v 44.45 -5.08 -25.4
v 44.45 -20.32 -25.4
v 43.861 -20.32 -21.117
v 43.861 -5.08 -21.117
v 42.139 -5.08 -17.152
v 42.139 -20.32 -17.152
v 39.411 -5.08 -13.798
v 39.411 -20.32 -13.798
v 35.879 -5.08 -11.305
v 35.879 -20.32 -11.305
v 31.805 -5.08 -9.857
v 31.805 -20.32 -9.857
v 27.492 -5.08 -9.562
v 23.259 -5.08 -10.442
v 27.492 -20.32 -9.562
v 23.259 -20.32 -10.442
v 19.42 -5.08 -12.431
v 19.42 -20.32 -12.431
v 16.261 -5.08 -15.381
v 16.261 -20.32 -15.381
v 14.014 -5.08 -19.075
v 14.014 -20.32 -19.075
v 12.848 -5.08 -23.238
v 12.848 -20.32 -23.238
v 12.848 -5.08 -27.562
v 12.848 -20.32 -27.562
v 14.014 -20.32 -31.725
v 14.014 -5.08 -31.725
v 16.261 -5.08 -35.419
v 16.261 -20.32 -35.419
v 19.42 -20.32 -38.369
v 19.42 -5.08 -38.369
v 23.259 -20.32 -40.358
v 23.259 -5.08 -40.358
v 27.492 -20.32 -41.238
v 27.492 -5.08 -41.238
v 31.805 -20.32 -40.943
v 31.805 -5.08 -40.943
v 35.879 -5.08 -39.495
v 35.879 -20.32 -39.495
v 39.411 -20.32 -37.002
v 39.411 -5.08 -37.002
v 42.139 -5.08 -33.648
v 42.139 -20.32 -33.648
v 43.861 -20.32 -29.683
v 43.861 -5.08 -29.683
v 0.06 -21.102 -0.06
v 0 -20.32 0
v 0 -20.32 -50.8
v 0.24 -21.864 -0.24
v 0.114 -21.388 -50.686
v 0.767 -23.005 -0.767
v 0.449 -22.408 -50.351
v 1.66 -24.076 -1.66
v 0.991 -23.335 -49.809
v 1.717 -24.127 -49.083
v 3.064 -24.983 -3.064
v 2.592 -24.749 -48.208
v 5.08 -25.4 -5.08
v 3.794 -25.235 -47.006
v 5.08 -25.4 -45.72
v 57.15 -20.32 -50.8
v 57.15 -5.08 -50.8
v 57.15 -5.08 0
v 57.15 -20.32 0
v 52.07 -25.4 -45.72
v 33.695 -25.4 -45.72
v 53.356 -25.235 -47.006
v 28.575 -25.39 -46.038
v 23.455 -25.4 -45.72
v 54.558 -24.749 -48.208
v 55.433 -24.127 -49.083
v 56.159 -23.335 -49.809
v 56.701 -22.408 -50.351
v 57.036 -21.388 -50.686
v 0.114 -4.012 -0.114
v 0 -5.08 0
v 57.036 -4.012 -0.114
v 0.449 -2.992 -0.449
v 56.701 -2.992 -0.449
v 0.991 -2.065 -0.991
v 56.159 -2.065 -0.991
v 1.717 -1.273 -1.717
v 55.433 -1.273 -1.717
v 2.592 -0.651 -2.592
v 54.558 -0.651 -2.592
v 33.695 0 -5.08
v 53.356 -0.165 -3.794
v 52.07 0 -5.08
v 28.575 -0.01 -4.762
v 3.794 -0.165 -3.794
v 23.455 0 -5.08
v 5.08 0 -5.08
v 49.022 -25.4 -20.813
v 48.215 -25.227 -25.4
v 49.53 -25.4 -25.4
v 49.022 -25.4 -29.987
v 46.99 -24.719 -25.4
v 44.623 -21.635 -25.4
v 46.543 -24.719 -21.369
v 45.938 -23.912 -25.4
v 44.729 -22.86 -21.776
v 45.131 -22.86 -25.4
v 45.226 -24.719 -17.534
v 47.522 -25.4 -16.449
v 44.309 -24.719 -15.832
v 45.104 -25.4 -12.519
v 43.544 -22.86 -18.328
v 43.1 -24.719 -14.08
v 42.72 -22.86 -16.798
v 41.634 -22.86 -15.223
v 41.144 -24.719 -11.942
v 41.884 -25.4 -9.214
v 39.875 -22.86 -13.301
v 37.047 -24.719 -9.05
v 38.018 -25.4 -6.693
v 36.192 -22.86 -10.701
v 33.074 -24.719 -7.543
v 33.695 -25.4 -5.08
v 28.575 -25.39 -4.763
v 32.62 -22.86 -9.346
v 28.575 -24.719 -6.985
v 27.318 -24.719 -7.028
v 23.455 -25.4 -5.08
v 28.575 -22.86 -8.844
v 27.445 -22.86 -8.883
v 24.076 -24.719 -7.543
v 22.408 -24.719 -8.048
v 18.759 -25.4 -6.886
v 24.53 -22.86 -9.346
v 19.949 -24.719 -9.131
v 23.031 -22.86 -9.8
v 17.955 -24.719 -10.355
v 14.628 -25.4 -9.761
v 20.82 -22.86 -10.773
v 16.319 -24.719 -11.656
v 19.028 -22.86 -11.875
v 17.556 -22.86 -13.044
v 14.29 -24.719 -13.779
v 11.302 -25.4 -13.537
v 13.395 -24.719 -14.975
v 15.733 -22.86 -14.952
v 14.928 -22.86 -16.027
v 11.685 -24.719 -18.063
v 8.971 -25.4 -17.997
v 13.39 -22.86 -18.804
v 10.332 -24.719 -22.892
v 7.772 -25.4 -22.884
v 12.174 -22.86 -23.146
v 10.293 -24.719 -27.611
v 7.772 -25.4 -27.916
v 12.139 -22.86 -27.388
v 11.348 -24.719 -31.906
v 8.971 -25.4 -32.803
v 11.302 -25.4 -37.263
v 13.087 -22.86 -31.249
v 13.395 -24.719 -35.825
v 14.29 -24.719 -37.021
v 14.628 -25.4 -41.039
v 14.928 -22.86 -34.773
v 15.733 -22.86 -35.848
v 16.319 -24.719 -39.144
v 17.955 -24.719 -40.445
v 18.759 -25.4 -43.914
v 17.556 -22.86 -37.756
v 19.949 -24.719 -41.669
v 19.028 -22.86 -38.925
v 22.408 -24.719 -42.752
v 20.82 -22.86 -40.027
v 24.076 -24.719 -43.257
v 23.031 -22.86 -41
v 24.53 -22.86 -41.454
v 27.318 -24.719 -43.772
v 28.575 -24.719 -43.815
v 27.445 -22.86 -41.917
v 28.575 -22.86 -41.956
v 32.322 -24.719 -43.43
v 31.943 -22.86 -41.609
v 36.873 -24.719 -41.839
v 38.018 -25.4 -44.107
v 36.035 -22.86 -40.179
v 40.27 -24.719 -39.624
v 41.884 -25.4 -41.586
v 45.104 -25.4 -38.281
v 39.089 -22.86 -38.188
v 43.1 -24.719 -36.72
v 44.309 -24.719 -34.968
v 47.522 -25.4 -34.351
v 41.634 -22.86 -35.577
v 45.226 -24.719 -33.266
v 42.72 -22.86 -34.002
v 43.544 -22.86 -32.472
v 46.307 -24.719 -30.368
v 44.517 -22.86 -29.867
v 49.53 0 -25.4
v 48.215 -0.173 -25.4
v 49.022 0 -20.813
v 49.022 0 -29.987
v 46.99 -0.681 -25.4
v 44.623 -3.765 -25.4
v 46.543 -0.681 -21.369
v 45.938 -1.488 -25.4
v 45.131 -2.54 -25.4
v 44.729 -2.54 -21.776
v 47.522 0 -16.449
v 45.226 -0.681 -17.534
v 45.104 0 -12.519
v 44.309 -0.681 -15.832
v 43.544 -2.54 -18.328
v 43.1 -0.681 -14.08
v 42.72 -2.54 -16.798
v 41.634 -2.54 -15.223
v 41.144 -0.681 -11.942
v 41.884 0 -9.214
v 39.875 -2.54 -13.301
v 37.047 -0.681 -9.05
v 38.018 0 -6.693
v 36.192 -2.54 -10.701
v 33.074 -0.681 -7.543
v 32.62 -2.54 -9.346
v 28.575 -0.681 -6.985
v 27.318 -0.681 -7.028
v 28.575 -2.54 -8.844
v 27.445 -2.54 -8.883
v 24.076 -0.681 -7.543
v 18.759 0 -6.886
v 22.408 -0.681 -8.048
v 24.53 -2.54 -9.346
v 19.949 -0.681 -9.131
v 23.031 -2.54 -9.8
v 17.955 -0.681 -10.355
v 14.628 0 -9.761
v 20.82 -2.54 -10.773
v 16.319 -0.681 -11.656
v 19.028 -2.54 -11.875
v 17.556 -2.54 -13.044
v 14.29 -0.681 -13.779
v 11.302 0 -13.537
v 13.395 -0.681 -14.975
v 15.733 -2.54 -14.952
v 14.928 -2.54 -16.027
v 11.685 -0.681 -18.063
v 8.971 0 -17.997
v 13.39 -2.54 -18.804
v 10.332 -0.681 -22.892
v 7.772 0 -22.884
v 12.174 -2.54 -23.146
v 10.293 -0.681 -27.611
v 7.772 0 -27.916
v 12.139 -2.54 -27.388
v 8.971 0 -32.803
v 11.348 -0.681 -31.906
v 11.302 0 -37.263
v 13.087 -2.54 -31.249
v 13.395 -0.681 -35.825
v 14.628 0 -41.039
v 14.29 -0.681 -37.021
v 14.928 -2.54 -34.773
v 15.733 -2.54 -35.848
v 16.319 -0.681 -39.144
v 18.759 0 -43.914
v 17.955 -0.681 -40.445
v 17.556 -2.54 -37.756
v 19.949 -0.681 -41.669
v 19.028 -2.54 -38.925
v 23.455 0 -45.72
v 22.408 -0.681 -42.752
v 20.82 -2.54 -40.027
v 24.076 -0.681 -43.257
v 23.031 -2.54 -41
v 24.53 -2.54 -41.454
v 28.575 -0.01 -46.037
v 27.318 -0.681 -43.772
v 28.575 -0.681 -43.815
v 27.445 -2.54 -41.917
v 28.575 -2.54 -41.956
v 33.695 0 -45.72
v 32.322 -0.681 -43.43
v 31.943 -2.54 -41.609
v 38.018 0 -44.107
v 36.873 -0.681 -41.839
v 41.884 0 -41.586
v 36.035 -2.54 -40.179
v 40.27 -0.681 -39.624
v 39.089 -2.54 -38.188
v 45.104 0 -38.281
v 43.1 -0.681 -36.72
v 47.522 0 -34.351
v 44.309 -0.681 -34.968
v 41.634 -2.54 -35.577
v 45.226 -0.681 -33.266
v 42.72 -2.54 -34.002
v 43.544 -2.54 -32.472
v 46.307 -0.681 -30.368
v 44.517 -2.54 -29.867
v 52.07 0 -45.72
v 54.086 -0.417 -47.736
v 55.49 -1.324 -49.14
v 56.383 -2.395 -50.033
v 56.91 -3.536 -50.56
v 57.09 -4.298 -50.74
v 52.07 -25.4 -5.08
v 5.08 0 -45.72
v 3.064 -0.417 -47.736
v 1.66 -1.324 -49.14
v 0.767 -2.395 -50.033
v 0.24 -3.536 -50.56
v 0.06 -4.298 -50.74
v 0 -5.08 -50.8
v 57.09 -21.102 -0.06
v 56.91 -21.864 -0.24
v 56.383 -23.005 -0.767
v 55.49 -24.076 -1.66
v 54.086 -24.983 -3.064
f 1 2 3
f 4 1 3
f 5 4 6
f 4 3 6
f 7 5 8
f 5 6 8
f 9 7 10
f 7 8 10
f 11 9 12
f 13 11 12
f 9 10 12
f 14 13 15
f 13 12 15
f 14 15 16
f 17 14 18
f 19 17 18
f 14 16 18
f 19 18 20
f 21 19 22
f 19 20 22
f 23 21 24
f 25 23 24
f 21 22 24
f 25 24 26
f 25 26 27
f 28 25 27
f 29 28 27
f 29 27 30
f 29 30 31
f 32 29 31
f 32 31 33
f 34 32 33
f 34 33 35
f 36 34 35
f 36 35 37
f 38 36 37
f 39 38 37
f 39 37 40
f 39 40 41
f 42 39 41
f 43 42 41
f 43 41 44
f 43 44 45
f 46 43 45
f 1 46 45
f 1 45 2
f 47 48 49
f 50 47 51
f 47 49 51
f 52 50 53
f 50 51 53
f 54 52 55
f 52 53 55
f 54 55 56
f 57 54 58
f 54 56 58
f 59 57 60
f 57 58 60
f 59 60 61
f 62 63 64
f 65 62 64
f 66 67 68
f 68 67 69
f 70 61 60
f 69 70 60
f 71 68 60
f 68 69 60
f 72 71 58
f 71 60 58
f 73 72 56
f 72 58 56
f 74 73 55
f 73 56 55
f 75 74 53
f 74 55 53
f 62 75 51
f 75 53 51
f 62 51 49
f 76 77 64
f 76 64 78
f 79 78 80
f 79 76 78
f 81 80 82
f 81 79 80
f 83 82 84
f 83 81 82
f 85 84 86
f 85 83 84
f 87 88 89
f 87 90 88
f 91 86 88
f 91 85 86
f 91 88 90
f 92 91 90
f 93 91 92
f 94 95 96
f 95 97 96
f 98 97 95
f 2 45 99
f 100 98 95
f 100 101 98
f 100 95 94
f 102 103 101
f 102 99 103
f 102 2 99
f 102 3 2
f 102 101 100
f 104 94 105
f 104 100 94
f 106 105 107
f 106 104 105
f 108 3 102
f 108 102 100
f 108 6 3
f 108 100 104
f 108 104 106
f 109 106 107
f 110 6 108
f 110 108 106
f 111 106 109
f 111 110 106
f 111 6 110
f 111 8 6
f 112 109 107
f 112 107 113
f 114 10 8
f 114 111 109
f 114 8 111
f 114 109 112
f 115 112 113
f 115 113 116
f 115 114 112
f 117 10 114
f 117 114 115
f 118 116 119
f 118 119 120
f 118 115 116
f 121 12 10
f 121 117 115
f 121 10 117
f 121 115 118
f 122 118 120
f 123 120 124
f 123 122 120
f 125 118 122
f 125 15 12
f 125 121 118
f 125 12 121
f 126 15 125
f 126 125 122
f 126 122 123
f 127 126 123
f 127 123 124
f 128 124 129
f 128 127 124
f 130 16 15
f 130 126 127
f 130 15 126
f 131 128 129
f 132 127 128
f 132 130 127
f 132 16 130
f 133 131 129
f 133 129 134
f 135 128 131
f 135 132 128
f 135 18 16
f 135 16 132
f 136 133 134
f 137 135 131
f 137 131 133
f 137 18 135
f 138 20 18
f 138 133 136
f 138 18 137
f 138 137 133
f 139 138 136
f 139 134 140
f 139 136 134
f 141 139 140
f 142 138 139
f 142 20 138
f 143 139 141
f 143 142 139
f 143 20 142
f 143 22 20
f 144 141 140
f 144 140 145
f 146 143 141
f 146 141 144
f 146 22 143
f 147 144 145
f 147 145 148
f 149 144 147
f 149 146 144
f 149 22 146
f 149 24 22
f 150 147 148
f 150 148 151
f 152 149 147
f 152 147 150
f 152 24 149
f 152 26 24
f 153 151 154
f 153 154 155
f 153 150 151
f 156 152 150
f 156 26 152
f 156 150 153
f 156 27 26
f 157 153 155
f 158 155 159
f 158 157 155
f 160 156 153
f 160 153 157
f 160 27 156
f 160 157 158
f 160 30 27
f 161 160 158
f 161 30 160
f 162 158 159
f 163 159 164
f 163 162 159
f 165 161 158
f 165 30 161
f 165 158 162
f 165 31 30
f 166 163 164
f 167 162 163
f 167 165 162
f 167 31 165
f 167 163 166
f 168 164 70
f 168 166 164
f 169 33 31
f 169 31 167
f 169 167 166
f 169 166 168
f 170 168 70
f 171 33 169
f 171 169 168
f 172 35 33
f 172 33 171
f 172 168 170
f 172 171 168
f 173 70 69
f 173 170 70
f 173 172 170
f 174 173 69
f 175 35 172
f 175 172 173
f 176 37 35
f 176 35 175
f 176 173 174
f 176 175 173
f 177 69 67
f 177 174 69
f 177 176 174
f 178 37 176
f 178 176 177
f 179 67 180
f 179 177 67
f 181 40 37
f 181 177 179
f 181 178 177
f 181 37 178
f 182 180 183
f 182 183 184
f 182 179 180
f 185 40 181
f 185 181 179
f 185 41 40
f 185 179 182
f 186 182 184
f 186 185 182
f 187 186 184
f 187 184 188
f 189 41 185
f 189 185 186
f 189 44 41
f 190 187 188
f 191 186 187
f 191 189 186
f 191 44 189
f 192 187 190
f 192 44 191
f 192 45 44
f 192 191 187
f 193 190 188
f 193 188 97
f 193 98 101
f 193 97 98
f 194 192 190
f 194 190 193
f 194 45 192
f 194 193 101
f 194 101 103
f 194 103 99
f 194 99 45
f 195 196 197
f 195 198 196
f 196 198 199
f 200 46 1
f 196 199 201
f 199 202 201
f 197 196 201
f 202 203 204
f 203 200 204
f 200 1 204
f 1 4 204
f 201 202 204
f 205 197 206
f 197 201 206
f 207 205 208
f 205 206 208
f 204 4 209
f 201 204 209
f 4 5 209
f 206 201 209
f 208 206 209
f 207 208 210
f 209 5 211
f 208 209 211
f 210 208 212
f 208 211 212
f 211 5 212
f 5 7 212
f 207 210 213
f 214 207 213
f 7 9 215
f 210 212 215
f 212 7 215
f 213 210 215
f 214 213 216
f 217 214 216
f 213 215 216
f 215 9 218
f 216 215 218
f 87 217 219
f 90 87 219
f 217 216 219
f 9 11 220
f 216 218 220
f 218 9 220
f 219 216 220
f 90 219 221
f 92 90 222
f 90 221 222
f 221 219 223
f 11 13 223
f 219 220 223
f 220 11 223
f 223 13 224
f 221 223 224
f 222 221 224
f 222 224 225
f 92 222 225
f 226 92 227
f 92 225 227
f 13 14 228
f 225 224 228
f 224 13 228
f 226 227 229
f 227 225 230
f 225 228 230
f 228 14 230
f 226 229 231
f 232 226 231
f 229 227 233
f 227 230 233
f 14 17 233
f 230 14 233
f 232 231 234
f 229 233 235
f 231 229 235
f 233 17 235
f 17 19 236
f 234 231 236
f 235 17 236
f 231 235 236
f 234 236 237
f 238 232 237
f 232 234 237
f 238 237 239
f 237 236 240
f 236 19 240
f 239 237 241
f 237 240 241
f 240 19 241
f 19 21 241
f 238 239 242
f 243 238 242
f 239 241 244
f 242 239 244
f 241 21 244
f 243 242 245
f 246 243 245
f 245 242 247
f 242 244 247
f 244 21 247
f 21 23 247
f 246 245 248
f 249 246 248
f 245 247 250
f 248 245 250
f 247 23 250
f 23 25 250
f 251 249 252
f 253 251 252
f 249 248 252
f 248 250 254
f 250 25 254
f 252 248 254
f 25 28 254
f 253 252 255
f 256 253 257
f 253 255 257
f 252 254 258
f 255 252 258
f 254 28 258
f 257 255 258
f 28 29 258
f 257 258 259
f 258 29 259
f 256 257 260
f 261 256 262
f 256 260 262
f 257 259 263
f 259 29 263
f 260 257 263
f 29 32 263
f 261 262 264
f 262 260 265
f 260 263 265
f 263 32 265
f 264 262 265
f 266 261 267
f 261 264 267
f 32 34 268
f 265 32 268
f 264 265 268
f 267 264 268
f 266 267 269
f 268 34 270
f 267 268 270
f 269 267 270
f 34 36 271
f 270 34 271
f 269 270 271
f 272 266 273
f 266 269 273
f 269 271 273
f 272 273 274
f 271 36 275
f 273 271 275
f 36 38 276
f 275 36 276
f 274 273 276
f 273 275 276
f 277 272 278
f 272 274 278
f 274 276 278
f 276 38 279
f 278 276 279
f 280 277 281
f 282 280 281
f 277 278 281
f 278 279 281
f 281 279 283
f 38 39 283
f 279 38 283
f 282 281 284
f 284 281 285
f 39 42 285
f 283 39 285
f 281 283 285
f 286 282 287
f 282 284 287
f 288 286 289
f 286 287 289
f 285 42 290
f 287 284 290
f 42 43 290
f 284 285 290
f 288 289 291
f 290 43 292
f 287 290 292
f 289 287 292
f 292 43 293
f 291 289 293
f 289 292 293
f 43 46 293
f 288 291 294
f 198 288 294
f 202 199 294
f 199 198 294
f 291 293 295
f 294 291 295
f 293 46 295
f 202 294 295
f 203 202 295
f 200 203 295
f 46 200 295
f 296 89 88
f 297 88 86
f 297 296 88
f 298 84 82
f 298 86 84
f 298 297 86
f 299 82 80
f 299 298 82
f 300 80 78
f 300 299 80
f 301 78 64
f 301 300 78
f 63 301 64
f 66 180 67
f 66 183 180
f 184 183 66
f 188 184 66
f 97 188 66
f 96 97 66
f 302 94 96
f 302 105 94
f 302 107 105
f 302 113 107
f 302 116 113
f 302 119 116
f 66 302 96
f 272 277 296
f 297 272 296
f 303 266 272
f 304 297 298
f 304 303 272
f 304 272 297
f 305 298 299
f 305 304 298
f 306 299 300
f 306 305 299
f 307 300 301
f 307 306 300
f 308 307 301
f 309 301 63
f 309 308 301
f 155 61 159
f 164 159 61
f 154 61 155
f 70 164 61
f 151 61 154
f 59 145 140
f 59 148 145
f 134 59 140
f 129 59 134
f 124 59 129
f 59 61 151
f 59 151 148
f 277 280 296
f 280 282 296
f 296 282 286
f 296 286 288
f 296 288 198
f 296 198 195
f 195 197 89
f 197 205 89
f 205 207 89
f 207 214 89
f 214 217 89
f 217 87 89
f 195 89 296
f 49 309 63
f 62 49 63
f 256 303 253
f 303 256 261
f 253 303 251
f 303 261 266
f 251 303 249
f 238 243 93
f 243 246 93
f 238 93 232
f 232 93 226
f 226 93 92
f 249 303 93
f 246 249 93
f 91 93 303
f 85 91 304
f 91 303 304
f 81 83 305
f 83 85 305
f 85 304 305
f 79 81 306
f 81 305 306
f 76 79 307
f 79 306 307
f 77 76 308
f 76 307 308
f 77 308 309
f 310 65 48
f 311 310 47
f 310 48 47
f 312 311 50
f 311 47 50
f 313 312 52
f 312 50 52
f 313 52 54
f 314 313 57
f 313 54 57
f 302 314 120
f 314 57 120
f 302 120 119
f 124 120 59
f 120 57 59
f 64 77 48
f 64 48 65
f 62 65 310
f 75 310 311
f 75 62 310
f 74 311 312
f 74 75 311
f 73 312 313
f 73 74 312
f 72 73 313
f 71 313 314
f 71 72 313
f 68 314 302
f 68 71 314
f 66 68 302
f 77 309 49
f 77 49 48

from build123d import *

# Parameters (mm, degrees)
F0_W        = 57.15
F0_H        = 50.8
F1_DEPTH    = 25.4
F2_DEPTH    = 25.4
F3_DEPTH    = 25.4
F4_R        = 15.875
F5_DEPTH    = 25.4
F6_T1_DEPTH = 82.55
F6_T3_DEPTH = 76.2
F7_T1_DEPTH = 82.55
F7_T3_DEPTH = 76.2


# Not quite as in the source:
# - a fillet or chamfer that OpenCascade refuses, or shapes differently, is made with other operations: its cross-section is extruded or revolved along the edge and cut away or added


with BuildPart() as f1:
    # F0 (on Front) → F1 (new body)
    with BuildSketch(Plane.XZ):
        with Locations((28.575, -25.4)):
            Rectangle(F0_W, F0_H)
    extrude(amount=F1_DEPTH)

    # F0 (on Front) → F2 (join)
    with BuildSketch(Plane.XZ):
        with Locations((28.575, -25.4)):
            Rectangle(F0_W, F0_H)
    extrude(amount=F2_DEPTH)

    # F0 (on Front) → F3 (join)
    with BuildSketch(Plane.XZ):
        with Locations((28.575, -25.4)):
            Rectangle(F0_W, F0_H)
    extrude(amount=F3_DEPTH)

    # F4 (on face) → F5 (cut)
    with BuildSketch(Plane.XZ.offset(25.4)):
        with Locations((28.575, -25.4)):
            Circle(F4_R)
    extrude(amount=-F5_DEPTH, mode=Mode.SUBTRACT)

    # F6: fillet of radius 5.08 on 5 edges, made by hand

    # F6_s2 → F6_t1 (cut)
    with BuildSketch(Plane.YZ.offset(-12.7)):
        with BuildLine():
            ThreePointArc((-20.32, 0), (-23.9121024484, -1.4878975516), (-25.4, -5.08))
            Line((-25.4, -5.08), (-25.4, 0))
            Line((-25.4, 0), (-20.32, 0))
        make_face()
        with BuildLine():
            ThreePointArc((-25.4, -45.72), (-23.9121024484, -49.3121024484), (-20.32, -50.8))
            Line((-20.32, -50.8), (-25.4, -50.8))
            Line((-25.4, -50.8), (-25.4, -45.72))
        make_face()
    extrude(amount=F6_T1_DEPTH, mode=Mode.SUBTRACT)

    # F6_s4 → F6_t3 (cut)
    with BuildSketch(Plane.XY.offset(-63.5)):
        with BuildLine():
            ThreePointArc((57.15, -20.32), (55.6621024484, -23.9121024484), (52.07, -25.4))
            Line((52.07, -25.4), (57.15, -25.4))
            Line((57.15, -25.4), (57.15, -20.32))
        make_face()
        with BuildLine():
            ThreePointArc((0, -20.32), (1.4878975516, -23.9121024484), (5.08, -25.4))
            Line((5.08, -25.4), (0, -25.4))
            Line((0, -25.4), (0, -20.32))
        make_face()
    extrude(amount=F6_T3_DEPTH, mode=Mode.SUBTRACT)

    # F6_s5 → F6_t6 (revolve, cut)
    with BuildSketch(Plane.XY.offset(-25.4)):
        with BuildLine():
            ThreePointArc((49.53, -25.4), (45.9378975516, -23.9121024484), (44.45, -20.32))
            Line((44.45, -20.32), (44.45, -25.4))
            Line((44.45, -25.4), (49.53, -25.4))
        make_face()
    revolve(axis=Axis((28.575, -25.4, -25.4), (0, -1, 0)), mode=Mode.SUBTRACT)

    # F7: fillet of radius 5.08 on 5 edges, made by hand

    # F7_s2 → F7_t1 (cut)
    with BuildSketch(Plane.YZ.offset(-12.7)):
        with BuildLine():
            ThreePointArc((-5.08, 0), (-1.4878975516, -1.4878975516), (0, -5.08))
            Line((0, -5.08), (0, 0))
            Line((0, 0), (-5.08, 0))
        make_face()
        with BuildLine():
            ThreePointArc((0, -45.72), (-1.4878975516, -49.3121024484), (-5.08, -50.8))
            Line((-5.08, -50.8), (0, -50.8))
            Line((0, -50.8), (0, -45.72))
        make_face()
    extrude(amount=F7_T1_DEPTH, mode=Mode.SUBTRACT)

    # F7_s4 → F7_t3 (cut)
    with BuildSketch(Plane.XY.offset(-63.5)):
        with BuildLine():
            ThreePointArc((52.07, 0), (55.6621024484, -1.4878975516), (57.15, -5.08))
            Line((57.15, -5.08), (57.15, 0))
            Line((57.15, 0), (52.07, 0))
        make_face()
        with BuildLine():
            ThreePointArc((5.08, 0), (1.4878975516, -1.4878975516), (0, -5.08))
            Line((0, -5.08), (0, 0))
            Line((0, 0), (5.08, 0))
        make_face()
    extrude(amount=F7_T3_DEPTH, mode=Mode.SUBTRACT)

    # F7_s5 → F7_t6 (revolve, cut)
    with BuildSketch(Plane.XY.offset(-25.4)):
        with BuildLine():
            ThreePointArc((49.53, 0), (45.9378975516, -1.4878975516), (44.45, -5.08))
            Line((44.45, -5.08), (44.45, 0))
            Line((44.45, 0), (49.53, 0))
        make_face()
    revolve(axis=Axis((28.575, 0, -25.4), (0, -1, 0)), mode=Mode.SUBTRACT)


solid = f1.part
